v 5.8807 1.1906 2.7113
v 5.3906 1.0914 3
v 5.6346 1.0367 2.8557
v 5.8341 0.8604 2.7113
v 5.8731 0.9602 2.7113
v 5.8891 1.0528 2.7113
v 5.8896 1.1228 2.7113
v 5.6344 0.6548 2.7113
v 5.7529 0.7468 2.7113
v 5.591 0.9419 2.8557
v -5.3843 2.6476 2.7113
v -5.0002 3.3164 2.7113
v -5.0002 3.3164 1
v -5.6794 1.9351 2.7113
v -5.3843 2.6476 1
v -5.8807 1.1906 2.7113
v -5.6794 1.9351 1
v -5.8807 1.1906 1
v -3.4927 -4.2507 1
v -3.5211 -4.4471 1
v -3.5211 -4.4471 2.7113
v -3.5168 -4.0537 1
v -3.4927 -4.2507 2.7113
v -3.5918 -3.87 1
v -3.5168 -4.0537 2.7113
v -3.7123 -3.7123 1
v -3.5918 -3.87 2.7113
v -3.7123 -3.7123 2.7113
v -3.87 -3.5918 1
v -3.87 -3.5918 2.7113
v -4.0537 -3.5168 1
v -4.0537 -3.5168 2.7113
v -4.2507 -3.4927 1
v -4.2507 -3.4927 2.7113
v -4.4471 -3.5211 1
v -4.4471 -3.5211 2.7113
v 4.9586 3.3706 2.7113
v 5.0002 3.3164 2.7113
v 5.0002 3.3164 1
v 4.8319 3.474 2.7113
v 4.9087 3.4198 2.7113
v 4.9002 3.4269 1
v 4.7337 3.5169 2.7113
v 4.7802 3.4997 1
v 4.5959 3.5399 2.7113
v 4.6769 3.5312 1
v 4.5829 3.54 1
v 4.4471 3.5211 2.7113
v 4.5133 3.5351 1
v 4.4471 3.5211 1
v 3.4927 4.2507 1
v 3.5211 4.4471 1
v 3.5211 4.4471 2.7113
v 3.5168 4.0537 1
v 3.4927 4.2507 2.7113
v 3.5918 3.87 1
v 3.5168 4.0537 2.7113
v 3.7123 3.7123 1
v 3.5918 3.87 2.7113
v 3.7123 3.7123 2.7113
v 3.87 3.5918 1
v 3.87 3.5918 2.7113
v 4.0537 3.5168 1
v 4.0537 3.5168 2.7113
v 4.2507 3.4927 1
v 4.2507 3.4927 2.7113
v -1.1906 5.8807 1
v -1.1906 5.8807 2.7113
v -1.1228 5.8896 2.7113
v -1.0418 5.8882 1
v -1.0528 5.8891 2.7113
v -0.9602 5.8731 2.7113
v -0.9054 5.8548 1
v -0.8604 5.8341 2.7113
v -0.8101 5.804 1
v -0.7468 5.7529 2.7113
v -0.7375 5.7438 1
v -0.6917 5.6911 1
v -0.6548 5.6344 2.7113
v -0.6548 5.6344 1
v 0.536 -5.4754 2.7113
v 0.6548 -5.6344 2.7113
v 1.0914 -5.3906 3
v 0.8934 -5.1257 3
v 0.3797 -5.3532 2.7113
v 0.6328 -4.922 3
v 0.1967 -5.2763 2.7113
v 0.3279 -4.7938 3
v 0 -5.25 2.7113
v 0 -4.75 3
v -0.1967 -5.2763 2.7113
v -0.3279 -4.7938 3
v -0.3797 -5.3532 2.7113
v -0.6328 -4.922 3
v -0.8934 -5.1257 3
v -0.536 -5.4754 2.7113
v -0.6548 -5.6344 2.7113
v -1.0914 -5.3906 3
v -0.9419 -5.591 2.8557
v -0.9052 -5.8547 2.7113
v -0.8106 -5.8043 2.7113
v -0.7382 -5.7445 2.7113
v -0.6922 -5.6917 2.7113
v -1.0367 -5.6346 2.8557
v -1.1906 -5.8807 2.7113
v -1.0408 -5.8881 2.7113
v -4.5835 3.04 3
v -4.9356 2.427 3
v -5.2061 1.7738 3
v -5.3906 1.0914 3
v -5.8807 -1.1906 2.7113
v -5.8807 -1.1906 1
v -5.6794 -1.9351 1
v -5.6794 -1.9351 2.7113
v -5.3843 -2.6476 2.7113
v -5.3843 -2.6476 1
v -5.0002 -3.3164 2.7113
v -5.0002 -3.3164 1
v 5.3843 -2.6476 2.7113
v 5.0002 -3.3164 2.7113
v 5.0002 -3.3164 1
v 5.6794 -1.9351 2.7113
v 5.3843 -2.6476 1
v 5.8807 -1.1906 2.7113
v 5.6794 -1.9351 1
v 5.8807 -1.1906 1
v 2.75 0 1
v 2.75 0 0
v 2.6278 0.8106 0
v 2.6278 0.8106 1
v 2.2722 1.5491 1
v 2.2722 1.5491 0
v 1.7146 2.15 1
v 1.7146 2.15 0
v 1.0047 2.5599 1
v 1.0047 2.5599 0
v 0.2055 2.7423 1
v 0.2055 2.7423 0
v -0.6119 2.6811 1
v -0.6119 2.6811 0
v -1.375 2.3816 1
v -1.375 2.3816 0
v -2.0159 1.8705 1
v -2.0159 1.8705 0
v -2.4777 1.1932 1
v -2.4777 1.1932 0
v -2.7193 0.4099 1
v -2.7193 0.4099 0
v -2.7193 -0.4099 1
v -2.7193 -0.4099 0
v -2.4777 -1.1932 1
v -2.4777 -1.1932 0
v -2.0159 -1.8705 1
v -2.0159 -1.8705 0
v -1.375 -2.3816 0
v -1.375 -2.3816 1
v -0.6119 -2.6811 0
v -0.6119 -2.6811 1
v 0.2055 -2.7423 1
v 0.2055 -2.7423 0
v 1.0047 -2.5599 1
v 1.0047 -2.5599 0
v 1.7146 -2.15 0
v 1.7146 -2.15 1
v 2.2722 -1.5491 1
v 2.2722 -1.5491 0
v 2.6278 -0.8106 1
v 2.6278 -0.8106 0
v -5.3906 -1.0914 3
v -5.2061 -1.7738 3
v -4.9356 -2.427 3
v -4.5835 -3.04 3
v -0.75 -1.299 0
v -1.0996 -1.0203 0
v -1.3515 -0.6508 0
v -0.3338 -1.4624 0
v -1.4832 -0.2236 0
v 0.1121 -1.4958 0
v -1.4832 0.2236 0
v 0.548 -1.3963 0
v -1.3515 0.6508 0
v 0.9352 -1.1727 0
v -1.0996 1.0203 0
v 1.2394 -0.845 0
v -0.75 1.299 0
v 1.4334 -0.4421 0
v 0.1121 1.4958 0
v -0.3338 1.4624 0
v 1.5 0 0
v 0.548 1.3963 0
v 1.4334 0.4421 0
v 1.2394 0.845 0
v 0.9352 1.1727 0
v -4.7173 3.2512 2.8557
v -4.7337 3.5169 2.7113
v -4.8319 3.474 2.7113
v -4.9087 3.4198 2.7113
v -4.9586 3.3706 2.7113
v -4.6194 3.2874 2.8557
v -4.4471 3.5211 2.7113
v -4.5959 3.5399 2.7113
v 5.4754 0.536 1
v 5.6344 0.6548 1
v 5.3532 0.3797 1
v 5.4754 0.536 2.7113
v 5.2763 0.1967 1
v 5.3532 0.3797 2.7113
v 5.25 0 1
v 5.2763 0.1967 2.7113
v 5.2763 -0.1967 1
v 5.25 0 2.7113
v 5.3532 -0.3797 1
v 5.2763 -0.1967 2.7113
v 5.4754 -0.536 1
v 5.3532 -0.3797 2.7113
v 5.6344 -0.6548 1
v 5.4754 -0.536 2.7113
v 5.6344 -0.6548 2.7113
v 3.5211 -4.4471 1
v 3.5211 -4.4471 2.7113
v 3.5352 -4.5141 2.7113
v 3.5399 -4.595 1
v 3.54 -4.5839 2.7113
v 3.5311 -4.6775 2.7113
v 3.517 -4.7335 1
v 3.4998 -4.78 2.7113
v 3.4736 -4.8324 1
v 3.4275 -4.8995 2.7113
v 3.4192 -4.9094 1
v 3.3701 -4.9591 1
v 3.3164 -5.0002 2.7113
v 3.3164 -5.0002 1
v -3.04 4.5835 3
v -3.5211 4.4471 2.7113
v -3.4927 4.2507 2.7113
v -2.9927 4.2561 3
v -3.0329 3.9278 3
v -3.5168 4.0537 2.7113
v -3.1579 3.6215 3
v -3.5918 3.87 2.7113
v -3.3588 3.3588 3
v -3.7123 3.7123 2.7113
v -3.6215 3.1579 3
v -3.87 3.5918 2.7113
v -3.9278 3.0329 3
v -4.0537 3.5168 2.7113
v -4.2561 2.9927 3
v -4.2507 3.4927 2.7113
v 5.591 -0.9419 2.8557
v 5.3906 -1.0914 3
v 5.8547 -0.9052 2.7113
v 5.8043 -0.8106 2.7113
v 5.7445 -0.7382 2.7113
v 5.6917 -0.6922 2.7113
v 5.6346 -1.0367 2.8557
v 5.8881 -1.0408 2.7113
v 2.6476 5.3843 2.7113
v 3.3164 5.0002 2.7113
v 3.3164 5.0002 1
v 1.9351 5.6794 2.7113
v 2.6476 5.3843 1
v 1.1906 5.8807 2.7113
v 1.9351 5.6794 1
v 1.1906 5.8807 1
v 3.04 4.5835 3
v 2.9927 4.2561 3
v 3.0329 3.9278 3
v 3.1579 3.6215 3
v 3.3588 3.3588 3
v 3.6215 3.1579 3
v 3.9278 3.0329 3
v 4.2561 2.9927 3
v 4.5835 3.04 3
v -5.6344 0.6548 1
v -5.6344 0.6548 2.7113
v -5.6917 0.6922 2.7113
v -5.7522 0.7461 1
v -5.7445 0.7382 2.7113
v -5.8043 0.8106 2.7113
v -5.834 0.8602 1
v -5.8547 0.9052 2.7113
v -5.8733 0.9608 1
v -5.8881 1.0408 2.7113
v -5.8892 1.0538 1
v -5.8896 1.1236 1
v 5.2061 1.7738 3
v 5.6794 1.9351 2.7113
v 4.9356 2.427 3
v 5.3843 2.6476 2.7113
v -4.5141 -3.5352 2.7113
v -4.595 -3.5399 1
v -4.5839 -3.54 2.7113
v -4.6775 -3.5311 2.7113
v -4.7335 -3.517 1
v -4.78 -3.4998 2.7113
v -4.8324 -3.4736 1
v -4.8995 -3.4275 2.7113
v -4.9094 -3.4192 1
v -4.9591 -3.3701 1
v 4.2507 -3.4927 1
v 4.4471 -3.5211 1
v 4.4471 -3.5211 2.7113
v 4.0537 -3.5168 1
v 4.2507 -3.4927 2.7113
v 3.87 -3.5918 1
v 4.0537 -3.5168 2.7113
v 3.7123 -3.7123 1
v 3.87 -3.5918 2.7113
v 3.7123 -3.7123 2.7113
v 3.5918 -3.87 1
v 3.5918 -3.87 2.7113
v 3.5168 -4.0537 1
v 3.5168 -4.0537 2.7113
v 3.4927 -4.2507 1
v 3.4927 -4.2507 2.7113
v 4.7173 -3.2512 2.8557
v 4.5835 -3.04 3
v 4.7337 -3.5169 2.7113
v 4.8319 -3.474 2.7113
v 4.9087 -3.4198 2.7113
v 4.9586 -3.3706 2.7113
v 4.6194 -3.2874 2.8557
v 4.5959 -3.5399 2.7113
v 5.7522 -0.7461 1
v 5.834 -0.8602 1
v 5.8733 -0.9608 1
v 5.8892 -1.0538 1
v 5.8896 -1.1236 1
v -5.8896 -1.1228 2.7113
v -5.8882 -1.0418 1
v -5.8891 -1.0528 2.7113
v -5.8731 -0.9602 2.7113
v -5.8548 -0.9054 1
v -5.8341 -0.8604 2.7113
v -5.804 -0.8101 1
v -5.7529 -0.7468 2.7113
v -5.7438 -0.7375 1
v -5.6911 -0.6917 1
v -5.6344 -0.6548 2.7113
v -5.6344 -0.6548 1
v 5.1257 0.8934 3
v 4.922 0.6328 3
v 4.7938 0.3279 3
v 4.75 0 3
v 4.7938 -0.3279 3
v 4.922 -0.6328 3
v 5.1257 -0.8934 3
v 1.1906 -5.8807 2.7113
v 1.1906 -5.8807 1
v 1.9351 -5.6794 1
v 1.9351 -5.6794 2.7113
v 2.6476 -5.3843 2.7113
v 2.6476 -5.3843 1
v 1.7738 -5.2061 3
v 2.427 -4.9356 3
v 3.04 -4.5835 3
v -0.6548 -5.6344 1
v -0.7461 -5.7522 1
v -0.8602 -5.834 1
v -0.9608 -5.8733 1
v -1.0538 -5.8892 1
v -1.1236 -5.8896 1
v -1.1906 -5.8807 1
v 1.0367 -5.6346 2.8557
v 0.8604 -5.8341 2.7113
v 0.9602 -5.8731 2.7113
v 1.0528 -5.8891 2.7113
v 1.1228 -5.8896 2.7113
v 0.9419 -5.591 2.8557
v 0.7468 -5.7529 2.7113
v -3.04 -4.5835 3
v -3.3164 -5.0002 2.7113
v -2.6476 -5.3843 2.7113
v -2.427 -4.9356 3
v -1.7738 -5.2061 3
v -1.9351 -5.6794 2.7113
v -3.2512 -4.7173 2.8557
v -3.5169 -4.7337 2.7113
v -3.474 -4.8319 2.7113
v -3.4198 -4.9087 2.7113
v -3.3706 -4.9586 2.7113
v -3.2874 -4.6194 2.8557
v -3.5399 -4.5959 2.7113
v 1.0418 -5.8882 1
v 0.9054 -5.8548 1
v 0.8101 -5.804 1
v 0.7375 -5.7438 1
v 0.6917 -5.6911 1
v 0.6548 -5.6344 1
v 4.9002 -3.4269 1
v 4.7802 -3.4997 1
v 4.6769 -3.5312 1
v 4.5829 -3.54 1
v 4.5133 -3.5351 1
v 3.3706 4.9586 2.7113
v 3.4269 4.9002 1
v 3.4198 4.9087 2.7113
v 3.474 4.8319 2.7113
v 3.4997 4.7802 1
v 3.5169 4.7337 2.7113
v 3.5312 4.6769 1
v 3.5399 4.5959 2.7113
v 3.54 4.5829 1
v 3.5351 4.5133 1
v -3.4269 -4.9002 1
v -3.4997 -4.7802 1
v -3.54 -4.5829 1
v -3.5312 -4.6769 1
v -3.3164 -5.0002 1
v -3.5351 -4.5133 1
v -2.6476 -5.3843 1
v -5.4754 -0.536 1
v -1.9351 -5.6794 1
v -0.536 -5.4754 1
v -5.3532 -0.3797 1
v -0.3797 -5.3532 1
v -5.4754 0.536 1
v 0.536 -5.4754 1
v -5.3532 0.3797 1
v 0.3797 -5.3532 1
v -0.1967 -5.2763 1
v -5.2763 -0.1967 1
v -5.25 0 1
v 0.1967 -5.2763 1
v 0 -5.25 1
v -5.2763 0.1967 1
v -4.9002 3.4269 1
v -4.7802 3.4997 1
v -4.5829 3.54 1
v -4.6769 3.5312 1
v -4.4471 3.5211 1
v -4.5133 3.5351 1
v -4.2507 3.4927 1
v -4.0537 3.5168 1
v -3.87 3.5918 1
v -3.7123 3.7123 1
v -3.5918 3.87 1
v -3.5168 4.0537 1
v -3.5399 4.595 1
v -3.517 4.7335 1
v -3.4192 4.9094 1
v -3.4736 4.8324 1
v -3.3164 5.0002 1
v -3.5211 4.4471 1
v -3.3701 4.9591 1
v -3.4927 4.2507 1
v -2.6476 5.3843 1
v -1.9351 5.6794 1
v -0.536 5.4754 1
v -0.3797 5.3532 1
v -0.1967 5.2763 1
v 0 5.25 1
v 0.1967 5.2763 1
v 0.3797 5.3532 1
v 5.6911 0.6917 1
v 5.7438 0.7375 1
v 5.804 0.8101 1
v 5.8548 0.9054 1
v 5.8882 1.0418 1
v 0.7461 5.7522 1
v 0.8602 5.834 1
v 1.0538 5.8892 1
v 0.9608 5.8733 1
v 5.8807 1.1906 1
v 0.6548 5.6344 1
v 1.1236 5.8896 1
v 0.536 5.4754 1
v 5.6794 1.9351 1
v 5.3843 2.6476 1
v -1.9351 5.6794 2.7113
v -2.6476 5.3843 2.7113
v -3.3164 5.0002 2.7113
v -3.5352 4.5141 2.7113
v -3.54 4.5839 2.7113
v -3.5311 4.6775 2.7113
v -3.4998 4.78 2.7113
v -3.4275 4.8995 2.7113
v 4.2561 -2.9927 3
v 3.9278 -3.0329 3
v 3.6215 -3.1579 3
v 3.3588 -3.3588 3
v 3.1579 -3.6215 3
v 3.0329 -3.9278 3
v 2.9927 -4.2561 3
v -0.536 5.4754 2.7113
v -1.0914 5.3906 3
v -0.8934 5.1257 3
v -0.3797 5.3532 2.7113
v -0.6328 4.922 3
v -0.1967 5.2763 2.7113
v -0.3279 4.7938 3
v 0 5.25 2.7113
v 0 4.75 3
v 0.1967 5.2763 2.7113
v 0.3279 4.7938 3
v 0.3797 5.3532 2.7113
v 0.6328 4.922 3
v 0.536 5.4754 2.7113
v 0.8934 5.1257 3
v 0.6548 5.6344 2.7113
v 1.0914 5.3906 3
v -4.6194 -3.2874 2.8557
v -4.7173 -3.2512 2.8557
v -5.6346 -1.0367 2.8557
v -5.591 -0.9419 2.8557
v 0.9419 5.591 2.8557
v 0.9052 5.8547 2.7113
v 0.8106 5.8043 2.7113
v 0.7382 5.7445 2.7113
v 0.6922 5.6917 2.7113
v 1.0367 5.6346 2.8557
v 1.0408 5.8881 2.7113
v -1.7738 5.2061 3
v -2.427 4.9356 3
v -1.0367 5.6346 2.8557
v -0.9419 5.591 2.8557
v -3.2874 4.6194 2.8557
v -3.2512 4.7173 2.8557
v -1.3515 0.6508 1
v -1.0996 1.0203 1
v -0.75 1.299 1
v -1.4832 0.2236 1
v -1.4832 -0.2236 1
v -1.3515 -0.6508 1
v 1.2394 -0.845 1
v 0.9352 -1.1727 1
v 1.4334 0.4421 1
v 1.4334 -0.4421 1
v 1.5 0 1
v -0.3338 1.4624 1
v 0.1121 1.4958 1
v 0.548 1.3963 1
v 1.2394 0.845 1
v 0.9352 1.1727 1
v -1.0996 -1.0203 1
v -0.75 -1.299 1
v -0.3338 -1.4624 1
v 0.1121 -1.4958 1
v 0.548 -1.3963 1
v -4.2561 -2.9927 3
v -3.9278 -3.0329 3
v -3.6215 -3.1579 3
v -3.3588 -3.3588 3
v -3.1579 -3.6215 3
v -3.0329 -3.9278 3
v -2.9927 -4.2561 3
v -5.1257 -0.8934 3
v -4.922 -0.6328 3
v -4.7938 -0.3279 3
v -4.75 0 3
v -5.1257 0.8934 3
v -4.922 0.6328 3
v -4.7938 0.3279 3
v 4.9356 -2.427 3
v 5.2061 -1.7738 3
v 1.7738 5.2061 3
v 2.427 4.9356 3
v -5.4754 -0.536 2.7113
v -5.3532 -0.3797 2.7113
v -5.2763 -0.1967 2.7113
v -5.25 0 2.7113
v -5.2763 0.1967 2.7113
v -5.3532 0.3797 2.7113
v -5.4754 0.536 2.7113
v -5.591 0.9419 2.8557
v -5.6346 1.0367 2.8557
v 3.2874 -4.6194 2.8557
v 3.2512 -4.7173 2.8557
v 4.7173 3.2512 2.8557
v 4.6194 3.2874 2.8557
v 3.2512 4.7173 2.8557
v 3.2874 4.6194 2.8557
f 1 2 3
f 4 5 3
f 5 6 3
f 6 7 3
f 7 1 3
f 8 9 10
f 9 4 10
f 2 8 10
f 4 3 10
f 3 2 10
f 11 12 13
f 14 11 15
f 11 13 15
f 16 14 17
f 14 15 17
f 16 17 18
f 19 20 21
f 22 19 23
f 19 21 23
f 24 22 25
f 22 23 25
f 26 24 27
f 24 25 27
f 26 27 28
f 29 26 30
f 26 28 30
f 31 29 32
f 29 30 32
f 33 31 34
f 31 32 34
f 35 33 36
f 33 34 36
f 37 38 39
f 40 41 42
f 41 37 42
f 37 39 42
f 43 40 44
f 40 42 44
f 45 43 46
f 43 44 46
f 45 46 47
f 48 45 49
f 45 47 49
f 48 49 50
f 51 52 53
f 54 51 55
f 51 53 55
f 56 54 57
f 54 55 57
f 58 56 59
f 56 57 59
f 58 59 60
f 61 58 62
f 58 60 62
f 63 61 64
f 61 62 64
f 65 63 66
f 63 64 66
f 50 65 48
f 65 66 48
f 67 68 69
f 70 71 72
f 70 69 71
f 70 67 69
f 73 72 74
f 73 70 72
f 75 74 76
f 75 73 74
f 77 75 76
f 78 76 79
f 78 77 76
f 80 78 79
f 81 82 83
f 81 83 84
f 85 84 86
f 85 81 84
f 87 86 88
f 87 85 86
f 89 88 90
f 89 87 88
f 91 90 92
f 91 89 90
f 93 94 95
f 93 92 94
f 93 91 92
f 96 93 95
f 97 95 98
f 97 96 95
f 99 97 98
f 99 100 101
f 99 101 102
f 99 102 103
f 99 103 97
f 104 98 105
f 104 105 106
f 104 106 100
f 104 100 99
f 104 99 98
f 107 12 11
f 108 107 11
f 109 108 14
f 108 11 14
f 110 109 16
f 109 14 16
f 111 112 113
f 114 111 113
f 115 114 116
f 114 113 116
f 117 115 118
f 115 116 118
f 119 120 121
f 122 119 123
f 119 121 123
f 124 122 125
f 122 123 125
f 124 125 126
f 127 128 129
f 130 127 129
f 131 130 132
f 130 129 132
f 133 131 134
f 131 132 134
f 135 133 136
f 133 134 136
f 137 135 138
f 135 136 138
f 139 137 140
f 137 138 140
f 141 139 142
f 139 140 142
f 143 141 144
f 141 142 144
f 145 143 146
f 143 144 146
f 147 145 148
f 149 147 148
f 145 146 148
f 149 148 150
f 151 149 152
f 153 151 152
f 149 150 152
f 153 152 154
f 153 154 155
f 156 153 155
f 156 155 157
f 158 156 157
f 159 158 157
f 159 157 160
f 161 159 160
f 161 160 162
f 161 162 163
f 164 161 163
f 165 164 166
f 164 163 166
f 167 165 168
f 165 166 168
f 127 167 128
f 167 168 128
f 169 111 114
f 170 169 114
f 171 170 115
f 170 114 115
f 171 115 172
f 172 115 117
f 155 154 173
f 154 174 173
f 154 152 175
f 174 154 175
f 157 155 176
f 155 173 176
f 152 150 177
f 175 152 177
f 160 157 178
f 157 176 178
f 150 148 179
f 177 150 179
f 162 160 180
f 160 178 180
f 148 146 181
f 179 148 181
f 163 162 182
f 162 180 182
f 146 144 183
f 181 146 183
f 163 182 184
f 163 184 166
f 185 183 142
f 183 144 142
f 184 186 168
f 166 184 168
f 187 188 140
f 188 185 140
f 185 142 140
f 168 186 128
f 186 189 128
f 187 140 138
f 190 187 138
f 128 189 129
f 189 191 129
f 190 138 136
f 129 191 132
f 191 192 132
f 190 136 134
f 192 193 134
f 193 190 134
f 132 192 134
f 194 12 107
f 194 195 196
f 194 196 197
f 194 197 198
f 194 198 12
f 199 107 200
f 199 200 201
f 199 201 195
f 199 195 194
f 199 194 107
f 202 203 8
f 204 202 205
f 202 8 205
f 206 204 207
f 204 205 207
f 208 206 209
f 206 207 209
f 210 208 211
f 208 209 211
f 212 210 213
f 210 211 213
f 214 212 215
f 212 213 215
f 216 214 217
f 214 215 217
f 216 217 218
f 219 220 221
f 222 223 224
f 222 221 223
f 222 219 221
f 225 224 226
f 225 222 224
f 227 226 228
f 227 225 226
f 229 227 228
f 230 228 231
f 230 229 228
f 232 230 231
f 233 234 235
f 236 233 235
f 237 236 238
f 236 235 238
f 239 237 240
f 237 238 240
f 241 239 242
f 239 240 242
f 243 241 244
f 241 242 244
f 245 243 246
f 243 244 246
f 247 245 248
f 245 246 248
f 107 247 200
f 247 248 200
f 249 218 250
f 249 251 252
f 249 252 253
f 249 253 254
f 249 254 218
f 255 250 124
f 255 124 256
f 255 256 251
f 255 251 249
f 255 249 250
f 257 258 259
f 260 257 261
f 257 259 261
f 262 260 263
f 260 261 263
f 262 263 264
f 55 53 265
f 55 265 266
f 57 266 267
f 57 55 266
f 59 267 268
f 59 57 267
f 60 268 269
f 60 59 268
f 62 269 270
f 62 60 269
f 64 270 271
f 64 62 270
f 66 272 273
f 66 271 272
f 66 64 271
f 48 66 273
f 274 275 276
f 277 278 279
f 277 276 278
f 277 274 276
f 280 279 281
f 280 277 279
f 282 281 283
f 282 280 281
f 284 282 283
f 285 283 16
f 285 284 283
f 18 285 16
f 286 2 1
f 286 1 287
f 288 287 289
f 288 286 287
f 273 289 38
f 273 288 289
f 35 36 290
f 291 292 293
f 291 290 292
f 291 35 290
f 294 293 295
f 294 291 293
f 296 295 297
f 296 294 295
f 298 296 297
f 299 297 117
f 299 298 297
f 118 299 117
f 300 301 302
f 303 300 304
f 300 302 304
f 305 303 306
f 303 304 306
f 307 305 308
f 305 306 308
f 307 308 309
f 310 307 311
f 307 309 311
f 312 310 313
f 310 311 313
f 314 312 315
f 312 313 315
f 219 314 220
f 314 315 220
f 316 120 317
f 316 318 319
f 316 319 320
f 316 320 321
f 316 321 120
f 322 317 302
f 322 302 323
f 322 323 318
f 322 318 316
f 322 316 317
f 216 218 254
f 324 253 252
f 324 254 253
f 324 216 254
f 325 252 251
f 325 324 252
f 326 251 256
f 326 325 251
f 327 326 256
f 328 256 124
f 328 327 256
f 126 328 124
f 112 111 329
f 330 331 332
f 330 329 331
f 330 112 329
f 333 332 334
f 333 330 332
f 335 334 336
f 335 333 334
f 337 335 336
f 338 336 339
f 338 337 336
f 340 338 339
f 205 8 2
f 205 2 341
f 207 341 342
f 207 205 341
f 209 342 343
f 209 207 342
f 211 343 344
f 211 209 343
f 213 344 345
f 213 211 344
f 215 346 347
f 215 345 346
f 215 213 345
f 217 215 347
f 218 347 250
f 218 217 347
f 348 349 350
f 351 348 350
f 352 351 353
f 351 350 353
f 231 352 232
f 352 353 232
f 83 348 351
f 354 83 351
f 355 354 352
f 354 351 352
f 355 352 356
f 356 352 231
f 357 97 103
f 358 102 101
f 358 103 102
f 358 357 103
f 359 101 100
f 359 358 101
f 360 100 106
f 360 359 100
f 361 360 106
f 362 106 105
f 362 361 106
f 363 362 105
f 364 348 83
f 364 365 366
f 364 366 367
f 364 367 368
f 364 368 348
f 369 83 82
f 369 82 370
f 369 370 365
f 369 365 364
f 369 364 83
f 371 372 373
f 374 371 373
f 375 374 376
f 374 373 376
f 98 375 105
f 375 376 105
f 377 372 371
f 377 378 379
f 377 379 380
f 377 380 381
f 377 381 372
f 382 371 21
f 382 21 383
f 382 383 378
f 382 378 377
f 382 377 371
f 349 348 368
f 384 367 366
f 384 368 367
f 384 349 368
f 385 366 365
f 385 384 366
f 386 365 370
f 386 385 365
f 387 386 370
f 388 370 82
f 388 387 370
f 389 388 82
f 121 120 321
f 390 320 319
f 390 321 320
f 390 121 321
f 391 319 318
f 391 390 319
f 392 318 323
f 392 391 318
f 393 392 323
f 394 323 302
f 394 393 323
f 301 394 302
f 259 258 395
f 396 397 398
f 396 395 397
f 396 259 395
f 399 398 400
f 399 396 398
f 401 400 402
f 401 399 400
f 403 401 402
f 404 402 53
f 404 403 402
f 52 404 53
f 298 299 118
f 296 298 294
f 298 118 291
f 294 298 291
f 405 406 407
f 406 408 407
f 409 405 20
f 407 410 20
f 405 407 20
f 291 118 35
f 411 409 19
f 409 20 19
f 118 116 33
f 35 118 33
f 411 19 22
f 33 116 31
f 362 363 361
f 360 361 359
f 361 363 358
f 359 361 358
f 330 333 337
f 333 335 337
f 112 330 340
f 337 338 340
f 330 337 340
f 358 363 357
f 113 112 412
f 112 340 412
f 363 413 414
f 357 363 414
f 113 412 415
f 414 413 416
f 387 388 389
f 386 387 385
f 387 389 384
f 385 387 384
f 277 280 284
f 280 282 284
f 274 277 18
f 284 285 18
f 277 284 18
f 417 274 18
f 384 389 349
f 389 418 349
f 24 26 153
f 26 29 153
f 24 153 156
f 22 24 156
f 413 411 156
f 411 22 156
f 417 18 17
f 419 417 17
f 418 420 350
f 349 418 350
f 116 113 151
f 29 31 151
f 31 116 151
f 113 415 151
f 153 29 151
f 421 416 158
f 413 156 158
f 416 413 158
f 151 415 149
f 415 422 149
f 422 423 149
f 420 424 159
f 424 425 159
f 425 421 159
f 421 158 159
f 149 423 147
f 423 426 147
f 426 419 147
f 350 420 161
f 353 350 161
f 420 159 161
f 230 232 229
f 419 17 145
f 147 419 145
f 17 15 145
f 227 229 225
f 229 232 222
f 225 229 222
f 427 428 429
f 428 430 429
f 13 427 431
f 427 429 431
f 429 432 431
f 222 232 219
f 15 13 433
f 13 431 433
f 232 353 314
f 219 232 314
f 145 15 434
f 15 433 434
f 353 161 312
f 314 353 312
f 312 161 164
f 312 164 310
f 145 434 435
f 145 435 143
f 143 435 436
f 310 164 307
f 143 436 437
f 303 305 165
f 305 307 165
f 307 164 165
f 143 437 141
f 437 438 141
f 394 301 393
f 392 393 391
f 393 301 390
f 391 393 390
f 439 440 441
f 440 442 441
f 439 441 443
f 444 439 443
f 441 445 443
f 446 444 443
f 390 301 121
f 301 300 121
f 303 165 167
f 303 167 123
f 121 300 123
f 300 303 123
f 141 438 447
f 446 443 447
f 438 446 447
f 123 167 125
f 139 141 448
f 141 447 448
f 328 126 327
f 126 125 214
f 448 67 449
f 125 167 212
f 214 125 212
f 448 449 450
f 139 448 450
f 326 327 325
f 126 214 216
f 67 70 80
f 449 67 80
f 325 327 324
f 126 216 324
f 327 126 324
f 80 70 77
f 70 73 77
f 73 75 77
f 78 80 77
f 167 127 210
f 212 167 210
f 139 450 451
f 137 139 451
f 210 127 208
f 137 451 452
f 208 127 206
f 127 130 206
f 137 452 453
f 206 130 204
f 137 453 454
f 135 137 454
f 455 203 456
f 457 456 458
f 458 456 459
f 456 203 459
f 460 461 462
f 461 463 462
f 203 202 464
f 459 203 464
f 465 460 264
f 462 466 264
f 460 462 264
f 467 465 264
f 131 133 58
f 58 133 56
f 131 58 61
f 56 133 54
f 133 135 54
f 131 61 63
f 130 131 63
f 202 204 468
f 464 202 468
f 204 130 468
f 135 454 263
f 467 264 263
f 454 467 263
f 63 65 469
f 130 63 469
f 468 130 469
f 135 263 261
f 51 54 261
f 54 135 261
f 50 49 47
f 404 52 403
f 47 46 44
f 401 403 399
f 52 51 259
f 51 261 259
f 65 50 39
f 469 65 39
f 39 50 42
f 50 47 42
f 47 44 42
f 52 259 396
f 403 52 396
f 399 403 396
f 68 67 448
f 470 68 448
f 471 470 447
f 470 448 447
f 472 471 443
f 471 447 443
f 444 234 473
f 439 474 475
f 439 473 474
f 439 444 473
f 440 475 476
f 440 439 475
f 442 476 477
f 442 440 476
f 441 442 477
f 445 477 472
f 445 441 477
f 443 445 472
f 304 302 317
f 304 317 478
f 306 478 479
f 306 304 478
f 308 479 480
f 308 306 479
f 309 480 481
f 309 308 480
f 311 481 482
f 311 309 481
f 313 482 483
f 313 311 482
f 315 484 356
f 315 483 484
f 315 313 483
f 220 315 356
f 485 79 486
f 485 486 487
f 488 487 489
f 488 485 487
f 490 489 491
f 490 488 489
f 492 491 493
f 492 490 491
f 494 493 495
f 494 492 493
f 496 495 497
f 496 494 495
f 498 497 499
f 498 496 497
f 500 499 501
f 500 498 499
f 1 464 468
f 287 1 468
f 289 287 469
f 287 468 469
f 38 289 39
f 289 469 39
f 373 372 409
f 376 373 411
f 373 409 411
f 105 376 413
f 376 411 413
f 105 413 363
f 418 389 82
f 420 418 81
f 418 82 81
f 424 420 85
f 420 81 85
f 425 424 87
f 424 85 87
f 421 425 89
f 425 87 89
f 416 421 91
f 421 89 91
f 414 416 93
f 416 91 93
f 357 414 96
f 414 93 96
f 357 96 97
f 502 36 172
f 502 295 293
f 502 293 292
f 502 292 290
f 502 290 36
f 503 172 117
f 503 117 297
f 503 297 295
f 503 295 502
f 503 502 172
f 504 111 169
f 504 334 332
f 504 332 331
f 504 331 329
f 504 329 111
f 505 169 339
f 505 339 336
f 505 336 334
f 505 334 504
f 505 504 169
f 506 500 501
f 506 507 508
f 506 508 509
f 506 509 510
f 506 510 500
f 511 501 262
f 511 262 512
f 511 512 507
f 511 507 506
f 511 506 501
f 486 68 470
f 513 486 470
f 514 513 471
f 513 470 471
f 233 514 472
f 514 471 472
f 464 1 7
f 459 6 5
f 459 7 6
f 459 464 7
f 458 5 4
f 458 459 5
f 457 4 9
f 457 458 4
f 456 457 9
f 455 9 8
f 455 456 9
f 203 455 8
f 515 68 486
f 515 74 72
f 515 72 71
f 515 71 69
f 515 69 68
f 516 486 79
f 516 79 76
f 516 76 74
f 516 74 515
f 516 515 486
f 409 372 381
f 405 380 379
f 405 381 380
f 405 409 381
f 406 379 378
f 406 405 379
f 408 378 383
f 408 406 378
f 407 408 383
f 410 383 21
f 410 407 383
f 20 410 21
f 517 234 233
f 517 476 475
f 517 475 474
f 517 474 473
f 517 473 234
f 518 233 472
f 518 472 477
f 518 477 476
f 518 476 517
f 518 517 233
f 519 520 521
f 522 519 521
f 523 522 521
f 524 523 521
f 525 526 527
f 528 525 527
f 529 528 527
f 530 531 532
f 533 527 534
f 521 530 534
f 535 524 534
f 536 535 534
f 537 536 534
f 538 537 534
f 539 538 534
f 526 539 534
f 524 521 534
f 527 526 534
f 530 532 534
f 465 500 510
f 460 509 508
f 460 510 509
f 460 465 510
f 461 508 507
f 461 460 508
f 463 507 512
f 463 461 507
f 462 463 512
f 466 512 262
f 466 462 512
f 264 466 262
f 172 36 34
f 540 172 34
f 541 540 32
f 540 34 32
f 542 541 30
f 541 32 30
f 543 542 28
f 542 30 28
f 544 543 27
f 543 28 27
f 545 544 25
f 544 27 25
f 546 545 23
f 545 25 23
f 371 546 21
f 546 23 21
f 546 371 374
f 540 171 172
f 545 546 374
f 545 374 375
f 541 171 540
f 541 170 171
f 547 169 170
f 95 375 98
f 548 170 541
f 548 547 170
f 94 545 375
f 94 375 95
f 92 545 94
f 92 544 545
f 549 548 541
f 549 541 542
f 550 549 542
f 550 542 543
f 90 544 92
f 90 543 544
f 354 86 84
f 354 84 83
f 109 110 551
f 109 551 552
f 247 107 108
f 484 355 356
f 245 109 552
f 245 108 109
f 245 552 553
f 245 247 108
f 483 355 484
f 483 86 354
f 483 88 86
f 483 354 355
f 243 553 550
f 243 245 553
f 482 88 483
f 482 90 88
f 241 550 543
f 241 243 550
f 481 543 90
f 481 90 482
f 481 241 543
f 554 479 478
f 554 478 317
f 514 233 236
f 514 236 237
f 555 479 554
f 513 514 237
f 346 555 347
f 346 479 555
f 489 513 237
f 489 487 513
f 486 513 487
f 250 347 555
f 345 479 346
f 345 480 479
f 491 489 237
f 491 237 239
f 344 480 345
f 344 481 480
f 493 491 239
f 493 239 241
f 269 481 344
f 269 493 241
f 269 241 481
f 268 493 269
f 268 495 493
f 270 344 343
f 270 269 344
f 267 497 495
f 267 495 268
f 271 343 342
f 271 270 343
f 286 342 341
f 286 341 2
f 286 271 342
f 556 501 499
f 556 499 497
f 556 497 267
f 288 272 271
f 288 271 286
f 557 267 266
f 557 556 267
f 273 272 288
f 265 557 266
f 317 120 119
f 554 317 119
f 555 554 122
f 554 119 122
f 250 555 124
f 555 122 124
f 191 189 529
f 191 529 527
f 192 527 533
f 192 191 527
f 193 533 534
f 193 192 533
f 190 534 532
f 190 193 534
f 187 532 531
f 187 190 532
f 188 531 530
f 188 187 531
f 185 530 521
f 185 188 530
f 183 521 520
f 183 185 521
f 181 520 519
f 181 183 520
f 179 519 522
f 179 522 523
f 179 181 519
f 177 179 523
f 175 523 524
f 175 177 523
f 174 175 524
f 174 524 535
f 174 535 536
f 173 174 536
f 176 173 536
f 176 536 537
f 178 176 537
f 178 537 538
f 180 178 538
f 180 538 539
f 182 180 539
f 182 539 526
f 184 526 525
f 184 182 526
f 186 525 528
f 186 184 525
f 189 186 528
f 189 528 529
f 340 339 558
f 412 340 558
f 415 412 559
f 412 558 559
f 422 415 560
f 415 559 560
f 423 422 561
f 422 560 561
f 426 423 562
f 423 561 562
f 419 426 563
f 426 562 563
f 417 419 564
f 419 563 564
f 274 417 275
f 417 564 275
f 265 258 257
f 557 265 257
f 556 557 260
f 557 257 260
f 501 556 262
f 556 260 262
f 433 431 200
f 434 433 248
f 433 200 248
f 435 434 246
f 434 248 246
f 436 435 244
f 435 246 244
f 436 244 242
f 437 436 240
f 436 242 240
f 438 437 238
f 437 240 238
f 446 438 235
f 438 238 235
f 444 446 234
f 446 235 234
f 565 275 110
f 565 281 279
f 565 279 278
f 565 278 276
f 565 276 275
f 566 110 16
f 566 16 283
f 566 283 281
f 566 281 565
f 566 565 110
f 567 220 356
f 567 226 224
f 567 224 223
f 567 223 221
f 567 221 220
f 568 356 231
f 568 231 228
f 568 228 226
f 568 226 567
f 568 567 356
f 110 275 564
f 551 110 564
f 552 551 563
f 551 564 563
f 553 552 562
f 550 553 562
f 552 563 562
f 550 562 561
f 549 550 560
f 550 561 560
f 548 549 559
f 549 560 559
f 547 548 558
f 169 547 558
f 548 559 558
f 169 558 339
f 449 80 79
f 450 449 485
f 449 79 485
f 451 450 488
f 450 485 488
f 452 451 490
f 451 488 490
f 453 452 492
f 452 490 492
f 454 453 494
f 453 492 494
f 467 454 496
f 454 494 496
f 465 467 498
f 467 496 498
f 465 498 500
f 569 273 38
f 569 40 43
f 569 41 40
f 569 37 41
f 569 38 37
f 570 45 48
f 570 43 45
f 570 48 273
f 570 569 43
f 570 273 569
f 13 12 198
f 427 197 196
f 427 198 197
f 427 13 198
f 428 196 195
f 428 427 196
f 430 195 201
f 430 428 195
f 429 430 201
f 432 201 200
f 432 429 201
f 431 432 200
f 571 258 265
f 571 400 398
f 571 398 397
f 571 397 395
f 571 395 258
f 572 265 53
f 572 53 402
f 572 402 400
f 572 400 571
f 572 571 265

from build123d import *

# Parameters (mm, degrees)
SKETCH_1_R          = 2.75
SKETCH_1_R_2        = 1.5
EXTRUDE_1_DEPTH     = 1
SKETCH_2_R          = 6
EXTRUDE_2_DEPTH     = 2
SKETCH_3_R          = 0.75
CUT_EXTRUDE_1_DEPTH = 22
FILLET_1_R          = 0.5


with BuildPart() as part:
    # 草图1 → 凸台-拉伸1 (new body)
    with BuildSketch(Plane.XY):
        Circle(SKETCH_1_R)
        Circle(SKETCH_1_R_2, mode=Mode.SUBTRACT)
    extrude(amount=EXTRUDE_1_DEPTH)

    # 草图2 → 凸台-拉伸2 (add)
    with BuildSketch(Plane.XY.offset(1)):
        Circle(SKETCH_2_R)
    extrude(amount=EXTRUDE_2_DEPTH)

    # 草图3 → 切除-拉伸1 (cut)
    with BuildSketch(Plane.XY.offset(3)):
        with Locations((0, 6)):
            Circle(SKETCH_3_R)
        with Locations((4.242640687, 4.242640687)):
            Circle(SKETCH_3_R)
        with Locations((6, 0)):
            Circle(SKETCH_3_R)
        with Locations((4.242640687, -4.242640687)):
            Circle(SKETCH_3_R)
        with Locations((0, -6)):
            Circle(SKETCH_3_R)
        with Locations((-4.242640687, -4.242640687)):
            Circle(SKETCH_3_R)
        with Locations((-6, 0)):
            Circle(SKETCH_3_R)
        with Locations((-4.242640687, 4.242640687)):
            Circle(SKETCH_3_R)
    extrude(amount=-CUT_EXTRUDE_1_DEPTH, mode=Mode.SUBTRACT)

    # 圆角1
    fillet_1_edges = [part.edges().sort_by_distance(p)[0] for p in [
        (0.748533723, 5.953125, 2),
        (-0.748533723, 5.953125, 2),
        (4.738788328, 3.680201785, 2),
        (3.680201785, 4.738788328, 2),
        (5.953125, -0.748533723, 2),
        (5.953125, 0.748533723, 2),
        (3.680201785, -4.738788328, 2),
        (4.738788328, -3.680201785, 2),
        (-0.748533723, -5.953125, 2),
        (0.748533723, -5.953125, 2),
        (-4.738788328, -3.680201785, 2),
        (-3.680201785, -4.738788328, 2),
        (-5.953125, 0.748533723, 2),
        (-5.953125, -0.748533723, 2),
        (-3.680201785, 4.738788328, 2),
        (-4.738788328, 3.680201785, 2),
    ]]
    fillet(fillet_1_edges, radius=FILLET_1_R)

    # 倒角1
    # the kernel refuses this chamfer: 0.5, 0.288675135 mm, written as the material it takes off along each edge
    with BuildSketch(Plane(origin=(4.242640687, 4.242640687, 3), x_dir=(-0.9621057405727662, 0.27267662891588135, 0), z_dir=(0.27267662891588135, 0.9621057405727662, 0))) as chamfer_1_piece_1:
        with BuildLine():
            Line((1.267320508, 0.01), (0.732679492, -0.298675135))
            Line((0.732679492, -0.298675135), (0.722679492, -0.298675135))
            ThreePointArc((0.722679492, -0.298675135), (0.74, -0.149337567), (0.74, 0))
            Line((0.74, 0), (0.75, 0.01))
            ThreePointArc((0.75, 0.01), (1.008660254, 0.01), (1.267320508, 0.02))
            Line((1.267320508, 0.02), (1.267320508, 0.01))
        make_face()
    revolve(axis=Axis((4.242640687, 4.242640687, 3), (0, 0, 1)), revolution_arc=121.64720829, mode=Mode.SUBTRACT)
    with BuildSketch(Plane(origin=(0, 6, 3), x_dir=(-0.8731229867550157, -0.48750000000000077, 0), z_dir=(-0.48750000000000077, 0.8731229867550157, 0))) as chamfer_1_piece_2:
        with BuildLine():
            Line((1.267320508, 0.01), (0.732679492, -0.298675135))
            Line((0.732679492, -0.298675135), (0.722679492, -0.298675135))
            ThreePointArc((0.722679492, -0.298675135), (0.74, -0.149337567), (0.74, 0))
            Line((0.74, 0), (0.75, 0.01))
            ThreePointArc((0.75, 0.01), (1.008660254, 0.01), (1.267320508, 0.02))
            Line((1.267320508, 0.02), (1.267320508, 0.01))
        make_face()
    revolve(axis=Axis((0, 6, 3), (0, 0, 1)), revolution_arc=121.64720829, mode=Mode.SUBTRACT)
    with BuildSketch(Plane(origin=(0, 0, 3), x_dir=(-0.19843704244432184, 0.9801136363636364, 0), z_dir=(0.9801136363636364, 0.19843704244432184, 0))) as chamfer_1_piece_3:
        with BuildLine():
            Line((5.482679492, 0.01), (6.017320508, -0.298675135))
            Line((6.017320508, -0.298675135), (6.027320508, -0.298675135))
            ThreePointArc((6.027320508, -0.298675135), (6.01, -0.149337567), (6.01, 0))
            Line((6.01, 0), (6, 0.01))
            ThreePointArc((6, 0.01), (5.741339746, 0.01), (5.482679492, 0.02))
            Line((5.482679492, 0.02), (5.482679492, 0.01))
        make_face()
    revolve(axis=Axis((0, 0, 3), (0, 0, 1)), revolution_arc=22.108847212, mode=Mode.SUBTRACT)
    with BuildSketch(Plane(origin=(-4.242640687, 4.242640687, 3), x_dir=(0.9621057405727664, 0.27267662891588074, 0), z_dir=(-0.27267662891588074, 0.9621057405727664, 0))) as chamfer_1_piece_4:
        with BuildLine():
            Line((1.267320508, -0.01), (0.732679492, 0.298675135))
            Line((0.732679492, 0.298675135), (0.722679492, 0.298675135))
            ThreePointArc((0.722679492, 0.298675135), (0.74, 0.149337567), (0.74, 0))
            Line((0.74, 0), (0.75, -0.01))
            ThreePointArc((0.75, -0.01), (1.008660254, -0.01), (1.267320508, -0.02))
            Line((1.267320508, -0.02), (1.267320508, -0.01))
        make_face()
    revolve(axis=Axis((-4.242640687, 4.242640687, 3), (0, 0, -1)), revolution_arc=121.64720829, mode=Mode.SUBTRACT)
    with BuildSketch(Plane(origin=(0, 0, 3), x_dir=(-0.8333611769571161, 0.5527288202551504, 0), z_dir=(0.5527288202551504, 0.8333611769571161, 0))) as chamfer_1_piece_5:
        with BuildLine():
            Line((5.482679492, 0.01), (6.017320508, -0.298675135))
            Line((6.017320508, -0.298675135), (6.027320508, -0.298675135))
            ThreePointArc((6.027320508, -0.298675135), (6.01, -0.149337567), (6.01, 0))
            Line((6.01, 0), (6, 0.01))
            ThreePointArc((6, 0.01), (5.741339746, 0.01), (5.482679492, 0.02))
            Line((5.482679492, 0.02), (5.482679492, 0.01))
        make_face()
    revolve(axis=Axis((0, 0, 3), (0, 0, 1)), revolution_arc=22.108847212, mode=Mode.SUBTRACT)
    with BuildSketch(Plane(origin=(-6, 0, 3), x_dir=(0.48750000000000004, 0.873122986755016, 0), z_dir=(-0.873122986755016, 0.48750000000000004, 0))) as chamfer_1_piece_6:
        with BuildLine():
            Line((1.267320508, -0.01), (0.732679492, 0.298675135))
            Line((0.732679492, 0.298675135), (0.722679492, 0.298675135))
            ThreePointArc((0.722679492, 0.298675135), (0.74, 0.149337567), (0.74, 0))
            Line((0.74, 0), (0.75, -0.01))
            ThreePointArc((0.75, -0.01), (1.008660254, -0.01), (1.267320508, -0.02))
            Line((1.267320508, -0.02), (1.267320508, -0.01))
        make_face()
    revolve(axis=Axis((-6, 0, 3), (0, 0, -1)), revolution_arc=121.64720829, mode=Mode.SUBTRACT)
    with BuildSketch(Plane(origin=(0, 0, 3), x_dir=(-0.9801136363636364, -0.198437042444322, 0), z_dir=(-0.198437042444322, 0.9801136363636364, 0))) as chamfer_1_piece_7:
        with BuildLine():
            Line((5.482679492, 0.01), (6.017320508, -0.298675135))
            Line((6.017320508, -0.298675135), (6.027320508, -0.298675135))
            ThreePointArc((6.027320508, -0.298675135), (6.01, -0.149337567), (6.01, 0))
            Line((6.01, 0), (6, 0.01))
            ThreePointArc((6, 0.01), (5.741339746, 0.01), (5.482679492, 0.02))
            Line((5.482679492, 0.02), (5.482679492, 0.01))
        make_face()
    revolve(axis=Axis((0, 0, 3), (0, 0, 1)), revolution_arc=22.108847212, mode=Mode.SUBTRACT)
    with BuildSketch(Plane(origin=(-4.242640687, -4.242640687, 3), x_dir=(-0.27267662891588196, 0.962105740572766, 0), z_dir=(-0.962105740572766, -0.27267662891588196, 0))) as chamfer_1_piece_8:
        with BuildLine():
            Line((1.267320508, -0.01), (0.732679492, 0.298675135))
            Line((0.732679492, 0.298675135), (0.722679492, 0.298675135))
            ThreePointArc((0.722679492, 0.298675135), (0.74, 0.149337567), (0.74, 0))
            Line((0.74, 0), (0.75, -0.01))
            ThreePointArc((0.75, -0.01), (1.008660254, -0.01), (1.267320508, -0.02))
            Line((1.267320508, -0.02), (1.267320508, -0.01))
        make_face()
    revolve(axis=Axis((-4.242640687, -4.242640687, 3), (0, 0, -1)), revolution_arc=121.64720829, mode=Mode.SUBTRACT)
    with BuildSketch(Plane(origin=(0, 0, 3), x_dir=(-0.5527288202551508, -0.8333611769571158, 0), z_dir=(-0.8333611769571158, 0.5527288202551508, 0))) as chamfer_1_piece_9:
        with BuildLine():
            Line((5.482679492, 0.01), (6.017320508, -0.298675135))
            Line((6.017320508, -0.298675135), (6.027320508, -0.298675135))
            ThreePointArc((6.027320508, -0.298675135), (6.01, -0.149337567), (6.01, 0))
            Line((6.01, 0), (6, 0.01))
            ThreePointArc((6, 0.01), (5.741339746, 0.01), (5.482679492, 0.02))
            Line((5.482679492, 0.02), (5.482679492, 0.01))
        make_face()
    revolve(axis=Axis((0, 0, 3), (0, 0, 1)), revolution_arc=22.108847212, mode=Mode.SUBTRACT)
    with BuildSketch(Plane(origin=(0, -6, 3), x_dir=(0.8731229867550155, 0.48750000000000077, 0), z_dir=(0.48750000000000077, -0.8731229867550155, 0))) as chamfer_1_piece_10:
        with BuildLine():
            Line((1.267320508, 0.01), (0.732679492, -0.298675135))
            Line((0.732679492, -0.298675135), (0.722679492, -0.298675135))
            ThreePointArc((0.722679492, -0.298675135), (0.74, -0.149337567), (0.74, 0))
            Line((0.74, 0), (0.75, 0.01))
            ThreePointArc((0.75, 0.01), (1.008660254, 0.01), (1.267320508, 0.02))
            Line((1.267320508, 0.02), (1.267320508, 0.01))
        make_face()
    revolve(axis=Axis((0, -6, 3), (0, 0, 1)), revolution_arc=121.64720829, mode=Mode.SUBTRACT)
    with BuildSketch(Plane(origin=(0, 0, 3), x_dir=(0.1984370424443215, -0.9801136363636364, 0), z_dir=(-0.9801136363636364, -0.1984370424443215, 0))) as chamfer_1_piece_11:
        with BuildLine():
            Line((5.482679492, 0.01), (6.017320508, -0.298675135))
            Line((6.017320508, -0.298675135), (6.027320508, -0.298675135))
            ThreePointArc((6.027320508, -0.298675135), (6.01, -0.149337567), (6.01, 0))
            Line((6.01, 0), (6, 0.01))
            ThreePointArc((6, 0.01), (5.741339746, 0.01), (5.482679492, 0.02))
            Line((5.482679492, 0.02), (5.482679492, 0.01))
        make_face()
    revolve(axis=Axis((0, 0, 3), (0, 0, 1)), revolution_arc=22.108847212, mode=Mode.SUBTRACT)
    with BuildSketch(Plane(origin=(4.242640687, -4.242640687, 3), x_dir=(0.2726766289158815, 0.9621057405727662, 0), z_dir=(0.9621057405727662, -0.2726766289158815, 0))) as chamfer_1_piece_12:
        with BuildLine():
            Line((1.267320508, 0.01), (0.732679492, -0.298675135))
            Line((0.732679492, -0.298675135), (0.722679492, -0.298675135))
            ThreePointArc((0.722679492, -0.298675135), (0.74, -0.149337567), (0.74, 0))
            Line((0.74, 0), (0.75, 0.01))
            ThreePointArc((0.75, 0.01), (1.008660254, 0.01), (1.267320508, 0.02))
            Line((1.267320508, 0.02), (1.267320508, 0.01))
        make_face()
    revolve(axis=Axis((4.242640687, -4.242640687, 3), (0, 0, 1)), revolution_arc=121.64720829, mode=Mode.SUBTRACT)
    with BuildSketch(Plane(origin=(0, 0, 3), x_dir=(0.8333611769571158, -0.5527288202551508, 0), z_dir=(-0.5527288202551508, -0.8333611769571158, 0))) as chamfer_1_piece_13:
        with BuildLine():
            Line((5.482679492, 0.01), (6.017320508, -0.298675135))
            Line((6.017320508, -0.298675135), (6.027320508, -0.298675135))
            ThreePointArc((6.027320508, -0.298675135), (6.01, -0.149337567), (6.01, 0))
            Line((6.01, 0), (6, 0.01))
            ThreePointArc((6, 0.01), (5.741339746, 0.01), (5.482679492, 0.02))
            Line((5.482679492, 0.02), (5.482679492, 0.01))
        make_face()
    revolve(axis=Axis((0, 0, 3), (0, 0, 1)), revolution_arc=22.108847212, mode=Mode.SUBTRACT)
    with BuildSketch(Plane(origin=(6, 0, 3), x_dir=(-0.48750000000000004, 0.8731229867550161, 0), z_dir=(0.8731229867550161, 0.48750000000000004, 0))) as chamfer_1_piece_14:
        with BuildLine():
            Line((1.267320508, 0.01), (0.732679492, -0.298675135))
            Line((0.732679492, -0.298675135), (0.722679492, -0.298675135))
            ThreePointArc((0.722679492, -0.298675135), (0.74, -0.149337567), (0.74, 0))
            Line((0.74, 0), (0.75, 0.01))
            ThreePointArc((0.75, 0.01), (1.008660254, 0.01), (1.267320508, 0.02))
            Line((1.267320508, 0.02), (1.267320508, 0.01))
        make_face()
    revolve(axis=Axis((6, 0, 3), (0, 0, 1)), revolution_arc=121.64720829, mode=Mode.SUBTRACT)
    with BuildSketch(Plane(origin=(0, 0, 3), x_dir=(0.9801136363636362, 0.19843704244432203, 0), z_dir=(0.19843704244432203, -0.9801136363636362, 0))) as chamfer_1_piece_15:
        with BuildLine():
            Line((6.017320508, -0.298675135), (5.482679492, 0.01))
            Line((5.482679492, 0.01), (5.482679492, 0.02))
            ThreePointArc((5.482679492, 0.02), (5.741339746, 0.01), (6, 0.01))
            Line((6, 0.01), (6.01, 0))
            ThreePointArc((6.01, 0), (6.01, -0.149337567), (6.027320508, -0.298675135))
            Line((6.027320508, -0.298675135), (6.017320508, -0.298675135))
        make_face()
    revolve(axis=Axis((0, 0, 3), (0, 0, 1)), revolution_arc=22.108847212, mode=Mode.SUBTRACT)
    with BuildSketch(Plane(origin=(1.091403731, 5.390625004, 3), x_dir=(-0.873122989459575, 0.4874999951560769, 0), z_dir=(-0.4874999951560769, -0.873122989459575, 0))) as chamfer_1_piece_16:
        with BuildLine():
            Line((0, 2e-09), (0.517320503, 0.298675135))
            Line((0.517320503, 0.298675135), (0.527320503, 0.298675135))
            ThreePointArc((0.527320503, 0.298675135), (0.509999995, 0.149337567), (0.509999996, 0))
            Line((0.509999996, 0), (0.499999996, -0.01))
            Line((0.499999996, -0.01), (0, -0.019665188))
            Line((0, -0.019665188), (0, 2e-09))
        make_face()
    revolve(axis=Axis((1.091403731, 5.390625004, 3), (0, 0, -1)), revolution_arc=72.269181175, mode=Mode.SUBTRACT)
    with BuildSketch(Plane(origin=(-1.091403731, 5.390625004, 3), x_dir=(-0.19843704788178793, 0.9801136352627491, 0), z_dir=(-0.9801136352627491, -0.19843704788178793, 0))) as chamfer_1_piece_17:
        with BuildLine():
            Line((0, 2e-09), (0.517320503, 0.298675135))
            Line((0.517320503, 0.298675135), (0.527320503, 0.298675135))
            ThreePointArc((0.527320503, 0.298675135), (0.509999995, 0.149337567), (0.509999996, 0))
            Line((0.509999996, 0), (0.499999996, -0.01))
            Line((0.499999996, -0.01), (0, -0.019665188))
            Line((0, -0.019665188), (0, 2e-09))
        make_face()
    revolve(axis=Axis((-1.091403731, 5.390625004, 3), (0, 0, -1)), revolution_arc=72.269181175, mode=Mode.SUBTRACT)
    with BuildSketch(Plane(origin=(-3.040008516, 4.583486475, 3), x_dir=(-0.9621057390600083, -0.27267663425346006, 0), z_dir=(0.27267663425346006, -0.9621057390600083, 0))) as chamfer_1_piece_18:
        with BuildLine():
            Line((0, 2e-09), (0.517320503, 0.298675135))
            Line((0.517320503, 0.298675135), (0.527320503, 0.298675135))
            ThreePointArc((0.527320503, 0.298675135), (0.509999995, 0.149337567), (0.509999996, 0))
            Line((0.509999996, 0), (0.499999996, -0.01))
            Line((0.499999996, -0.01), (0, -0.019665188))
            Line((0, -0.019665188), (0, 2e-09))
        make_face()
    revolve(axis=Axis((-3.040008516, 4.583486475, 3), (0, 0, -1)), revolution_arc=72.269181175, mode=Mode.SUBTRACT)
    with BuildSketch(Plane(origin=(-4.583486475, 3.040008516, 3), x_dir=(-0.8333611800235503, 0.5527288156318211, 0), z_dir=(-0.5527288156318211, -0.8333611800235503, 0))) as chamfer_1_piece_19:
        with BuildLine():
            Line((0, 2e-09), (0.517320503, 0.298675135))
            Line((0.517320503, 0.298675135), (0.527320503, 0.298675135))
            ThreePointArc((0.527320503, 0.298675135), (0.509999995, 0.149337567), (0.509999996, 0))
            Line((0.509999996, 0), (0.499999996, -0.01))
            Line((0.499999996, -0.01), (0, -0.019665188))
            Line((0, -0.019665188), (0, 2e-09))
        make_face()
    revolve(axis=Axis((-4.583486475, 3.040008516, 3), (0, 0, -1)), revolution_arc=72.269181175, mode=Mode.SUBTRACT)
    with BuildSketch(Plane(origin=(-5.390625004, 1.091403731, 3), x_dir=(-0.48749999515608566, -0.8731229894595701, 0), z_dir=(0.8731229894595701, -0.48749999515608566, 0))) as chamfer_1_piece_20:
        with BuildLine():
            Line((0, 2e-09), (0.517320503, 0.298675135))
            Line((0.517320503, 0.298675135), (0.527320503, 0.298675135))
            ThreePointArc((0.527320503, 0.298675135), (0.509999995, 0.149337567), (0.509999996, 0))
            Line((0.509999996, 0), (0.499999996, -0.01))
            Line((0.499999996, -0.01), (0, -0.019665188))
            Line((0, -0.019665188), (0, 2e-09))
        make_face()
    revolve(axis=Axis((-5.390625004, 1.091403731, 3), (0, 0, -1)), revolution_arc=72.269181175, mode=Mode.SUBTRACT)
    with BuildSketch(Plane(origin=(-5.390625004, -1.091403731, 3), x_dir=(-0.9801136352627474, -0.19843704788179609, 0), z_dir=(0.19843704788179609, -0.9801136352627474, 0))) as chamfer_1_piece_21:
        with BuildLine():
            Line((0, 2e-09), (0.517320503, 0.298675135))
            Line((0.517320503, 0.298675135), (0.527320503, 0.298675135))
            ThreePointArc((0.527320503, 0.298675135), (0.509999995, 0.149337567), (0.509999996, 0))
            Line((0.509999996, 0), (0.499999996, -0.01))
            Line((0.499999996, -0.01), (0, -0.019665188))
            Line((0, -0.019665188), (0, 2e-09))
        make_face()
    revolve(axis=Axis((-5.390625004, -1.091403731, 3), (0, 0, -1)), revolution_arc=72.269181175, mode=Mode.SUBTRACT)
    with BuildSketch(Plane(origin=(-4.583486475, -3.040008516, 3), x_dir=(0.2726766342534678, -0.9621057390600061, 0), z_dir=(0.9621057390600061, 0.2726766342534678, 0))) as chamfer_1_piece_22:
        with BuildLine():
            Line((0, 2e-09), (0.517320503, 0.298675135))
            Line((0.517320503, 0.298675135), (0.527320503, 0.298675135))
            ThreePointArc((0.527320503, 0.298675135), (0.509999995, 0.149337567), (0.509999996, 0))
            Line((0.509999996, 0), (0.499999996, -0.01))
            Line((0.499999996, -0.01), (0, -0.019665188))
            Line((0, -0.019665188), (0, 2e-09))
        make_face()
    revolve(axis=Axis((-4.583486475, -3.040008516, 3), (0, 0, -1)), revolution_arc=72.269181175, mode=Mode.SUBTRACT)
    with BuildSketch(Plane(origin=(-3.040008516, -4.583486475, 3), x_dir=(-0.5527288156318109, -0.8333611800235572, 0), z_dir=(0.8333611800235572, -0.5527288156318109, 0))) as chamfer_1_piece_23:
        with BuildLine():
            Line((0, 2e-09), (0.517320503, 0.298675135))
            Line((0.517320503, 0.298675135), (0.527320503, 0.298675135))
            ThreePointArc((0.527320503, 0.298675135), (0.509999995, 0.149337567), (0.509999996, 0))
            Line((0.509999996, 0), (0.499999996, -0.01))
            Line((0.499999996, -0.01), (0, -0.019665188))
            Line((0, -0.019665188), (0, 2e-09))
        make_face()
    revolve(axis=Axis((-3.040008516, -4.583486475, 3), (0, 0, -1)), revolution_arc=72.269181175, mode=Mode.SUBTRACT)
    with BuildSketch(Plane(origin=(1.091403731, -5.390625004, 3), x_dir=(0.19843704788180544, -0.9801136352627454, 0), z_dir=(0.9801136352627454, 0.19843704788180544, 0))) as chamfer_1_piece_24:
        with BuildLine():
            Line((0, 2e-09), (0.517320503, 0.298675135))
            Line((0.517320503, 0.298675135), (0.527320503, 0.298675135))
            ThreePointArc((0.527320503, 0.298675135), (0.509999995, 0.149337567), (0.509999996, 0))
            Line((0.509999996, 0), (0.499999996, -0.01))
            Line((0.499999996, -0.01), (0, -0.019665188))
            Line((0, -0.019665188), (0, 2e-09))
        make_face()
    revolve(axis=Axis((1.091403731, -5.390625004, 3), (0, 0, -1)), revolution_arc=72.269181175, mode=Mode.SUBTRACT)
    with BuildSketch(Plane(origin=(-1.091403731, -5.390625004, 3), x_dir=(0.8731229894595748, -0.48749999515607717, 0), z_dir=(0.48749999515607717, 0.8731229894595748, 0))) as chamfer_1_piece_25:
        with BuildLine():
            Line((0, 2e-09), (0.517320503, 0.298675135))
            Line((0.517320503, 0.298675135), (0.527320503, 0.298675135))
            ThreePointArc((0.527320503, 0.298675135), (0.509999995, 0.149337567), (0.509999996, 0))
            Line((0.509999996, 0), (0.499999996, -0.01))
            Line((0.499999996, -0.01), (0, -0.019665188))
            Line((0, -0.019665188), (0, 2e-09))
        make_face()
    revolve(axis=Axis((-1.091403731, -5.390625004, 3), (0, 0, -1)), revolution_arc=72.269181175, mode=Mode.SUBTRACT)
    with BuildSketch(Plane(origin=(3.040008516, -4.583486475, 3), x_dir=(0.9621057390600103, 0.27267663425345307, 0), z_dir=(-0.27267663425345307, 0.9621057390600103, 0))) as chamfer_1_piece_26:
        with BuildLine():
            Line((0, 2e-09), (0.517320503, 0.298675135))
            Line((0.517320503, 0.298675135), (0.527320503, 0.298675135))
            ThreePointArc((0.527320503, 0.298675135), (0.509999995, 0.149337567), (0.509999996, 0))
            Line((0.509999996, 0), (0.499999996, -0.01))
            Line((0.499999996, -0.01), (0, -0.019665188))
            Line((0, -0.019665188), (0, 2e-09))
        make_face()
    revolve(axis=Axis((3.040008516, -4.583486475, 3), (0, 0, -1)), revolution_arc=72.269181175, mode=Mode.SUBTRACT)
    with BuildSketch(Plane(origin=(4.583486475, -3.040008516, 3), x_dir=(0.8333611800235367, -0.5527288156318417, 0), z_dir=(0.5527288156318417, 0.8333611800235367, 0))) as chamfer_1_piece_27:
        with BuildLine():
            Line((0, 2e-09), (0.517320503, 0.298675135))
            Line((0.517320503, 0.298675135), (0.527320503, 0.298675135))
            ThreePointArc((0.527320503, 0.298675135), (0.509999995, 0.149337567), (0.509999996, 0))
            Line((0.509999996, 0), (0.499999996, -0.01))
            Line((0.499999996, -0.01), (0, -0.019665188))
            Line((0, -0.019665188), (0, 2e-09))
        make_face()
    revolve(axis=Axis((4.583486475, -3.040008516, 3), (0, 0, -1)), revolution_arc=72.269181175, mode=Mode.SUBTRACT)
    with BuildSketch(Plane(origin=(5.390625004, 1.091403731, 3), x_dir=(0.9801136352627478, 0.1984370478817941, 0), z_dir=(-0.1984370478817941, 0.9801136352627478, 0))) as chamfer_1_piece_28:
        with BuildLine():
            Line((0.517320503, 0.298675135), (0, 2e-09))
            Line((0, 2e-09), (0, -0.019665188))
            Line((0, -0.019665188), (0.499999996, -0.01))
            Line((0.499999996, -0.01), (0.509999996, 0))
            ThreePointArc((0.509999996, 0), (0.509999995, 0.149337567), (0.527320503, 0.298675135))
            Line((0.527320503, 0.298675135), (0.517320503, 0.298675135))
        make_face()
    revolve(axis=Axis((5.390625004, 1.091403731, 3), (0, 0, -1)), revolution_arc=72.269181175, mode=Mode.SUBTRACT)
    with BuildSketch(Plane(origin=(5.390625004, -1.091403731, 3), x_dir=(0.4874999951560918, 0.8731229894595666, 0), z_dir=(-0.8731229894595666, 0.4874999951560918, 0))) as chamfer_1_piece_29:
        with BuildLine():
            Line((0, 2e-09), (0.517320503, 0.298675135))
            Line((0.517320503, 0.298675135), (0.527320503, 0.298675135))
            ThreePointArc((0.527320503, 0.298675135), (0.509999995, 0.149337567), (0.509999996, 0))
            Line((0.509999996, 0), (0.499999996, -0.01))
            Line((0.499999996, -0.01), (0, -0.019665188))
            Line((0, -0.019665188), (0, 2e-09))
        make_face()
    revolve(axis=Axis((5.390625004, -1.091403731, 3), (0, 0, -1)), revolution_arc=72.269181175, mode=Mode.SUBTRACT)
    with BuildSketch(Plane(origin=(4.583486475, 3.040008516, 3), x_dir=(0.833361180023539, 0.5527288156318383, 0), z_dir=(0.5527288156318383, -0.833361180023539, 0))) as chamfer_1_piece_30:
        with BuildLine():
            Line((0.517320503, -0.298675135), (0, -2e-09))
            Line((0, -2e-09), (0, 0.019665188))
            Line((0, 0.019665188), (0.499999996, 0.01))
            Line((0.499999996, 0.01), (0.509999996, 0))
            ThreePointArc((0.509999996, 0), (0.509999995, -0.149337567), (0.527320503, -0.298675135))
            Line((0.527320503, -0.298675135), (0.517320503, -0.298675135))
        make_face()
    revolve(axis=Axis((4.583486475, 3.040008516, 3), (0, 0, 1)), revolution_arc=72.269181175, mode=Mode.SUBTRACT)
    with BuildSketch(Plane(origin=(3.040008516, 4.583486475, 3), x_dir=(0.5527288156318306, 0.833361180023544, 0), z_dir=(-0.833361180023544, 0.5527288156318306, 0))) as chamfer_1_piece_31:
        with BuildLine():
            Line((0, 2e-09), (0.517320503, 0.298675135))
            Line((0.517320503, 0.298675135), (0.527320503, 0.298675135))
            ThreePointArc((0.527320503, 0.298675135), (0.509999995, 0.149337567), (0.509999996, 0))
            Line((0.509999996, 0), (0.499999996, -0.01))
            Line((0.499999996, -0.01), (0, -0.019665188))
            Line((0, -0.019665188), (0, 2e-09))
        make_face()
    revolve(axis=Axis((3.040008516, 4.583486475, 3), (0, 0, -1)), revolution_arc=72.269181175, mode=Mode.SUBTRACT)
    with BuildSketch(Plane(origin=(0, 0, 3), x_dir=(0.5527288202551502, 0.8333611769571161, 0), z_dir=(0.8333611769571161, -0.5527288202551502, 0))) as chamfer_1_piece_32:
        with BuildLine():
            Line((5.482679492, 0.01), (6.017320508, -0.298675135))
            Line((6.017320508, -0.298675135), (6.027320508, -0.298675135))
            ThreePointArc((6.027320508, -0.298675135), (6.01, -0.149337567), (6.01, 0))
            Line((6.01, 0), (6, 0.01))
            ThreePointArc((6, 0.01), (5.741339746, 0.01), (5.482679492, 0.02))
            Line((5.482679492, 0.02), (5.482679492, 0.01))
        make_face()
    revolve(axis=Axis((0, 0, 3), (0, 0, 1)), revolution_arc=22.108847212, mode=Mode.SUBTRACT)


solid = part.part
